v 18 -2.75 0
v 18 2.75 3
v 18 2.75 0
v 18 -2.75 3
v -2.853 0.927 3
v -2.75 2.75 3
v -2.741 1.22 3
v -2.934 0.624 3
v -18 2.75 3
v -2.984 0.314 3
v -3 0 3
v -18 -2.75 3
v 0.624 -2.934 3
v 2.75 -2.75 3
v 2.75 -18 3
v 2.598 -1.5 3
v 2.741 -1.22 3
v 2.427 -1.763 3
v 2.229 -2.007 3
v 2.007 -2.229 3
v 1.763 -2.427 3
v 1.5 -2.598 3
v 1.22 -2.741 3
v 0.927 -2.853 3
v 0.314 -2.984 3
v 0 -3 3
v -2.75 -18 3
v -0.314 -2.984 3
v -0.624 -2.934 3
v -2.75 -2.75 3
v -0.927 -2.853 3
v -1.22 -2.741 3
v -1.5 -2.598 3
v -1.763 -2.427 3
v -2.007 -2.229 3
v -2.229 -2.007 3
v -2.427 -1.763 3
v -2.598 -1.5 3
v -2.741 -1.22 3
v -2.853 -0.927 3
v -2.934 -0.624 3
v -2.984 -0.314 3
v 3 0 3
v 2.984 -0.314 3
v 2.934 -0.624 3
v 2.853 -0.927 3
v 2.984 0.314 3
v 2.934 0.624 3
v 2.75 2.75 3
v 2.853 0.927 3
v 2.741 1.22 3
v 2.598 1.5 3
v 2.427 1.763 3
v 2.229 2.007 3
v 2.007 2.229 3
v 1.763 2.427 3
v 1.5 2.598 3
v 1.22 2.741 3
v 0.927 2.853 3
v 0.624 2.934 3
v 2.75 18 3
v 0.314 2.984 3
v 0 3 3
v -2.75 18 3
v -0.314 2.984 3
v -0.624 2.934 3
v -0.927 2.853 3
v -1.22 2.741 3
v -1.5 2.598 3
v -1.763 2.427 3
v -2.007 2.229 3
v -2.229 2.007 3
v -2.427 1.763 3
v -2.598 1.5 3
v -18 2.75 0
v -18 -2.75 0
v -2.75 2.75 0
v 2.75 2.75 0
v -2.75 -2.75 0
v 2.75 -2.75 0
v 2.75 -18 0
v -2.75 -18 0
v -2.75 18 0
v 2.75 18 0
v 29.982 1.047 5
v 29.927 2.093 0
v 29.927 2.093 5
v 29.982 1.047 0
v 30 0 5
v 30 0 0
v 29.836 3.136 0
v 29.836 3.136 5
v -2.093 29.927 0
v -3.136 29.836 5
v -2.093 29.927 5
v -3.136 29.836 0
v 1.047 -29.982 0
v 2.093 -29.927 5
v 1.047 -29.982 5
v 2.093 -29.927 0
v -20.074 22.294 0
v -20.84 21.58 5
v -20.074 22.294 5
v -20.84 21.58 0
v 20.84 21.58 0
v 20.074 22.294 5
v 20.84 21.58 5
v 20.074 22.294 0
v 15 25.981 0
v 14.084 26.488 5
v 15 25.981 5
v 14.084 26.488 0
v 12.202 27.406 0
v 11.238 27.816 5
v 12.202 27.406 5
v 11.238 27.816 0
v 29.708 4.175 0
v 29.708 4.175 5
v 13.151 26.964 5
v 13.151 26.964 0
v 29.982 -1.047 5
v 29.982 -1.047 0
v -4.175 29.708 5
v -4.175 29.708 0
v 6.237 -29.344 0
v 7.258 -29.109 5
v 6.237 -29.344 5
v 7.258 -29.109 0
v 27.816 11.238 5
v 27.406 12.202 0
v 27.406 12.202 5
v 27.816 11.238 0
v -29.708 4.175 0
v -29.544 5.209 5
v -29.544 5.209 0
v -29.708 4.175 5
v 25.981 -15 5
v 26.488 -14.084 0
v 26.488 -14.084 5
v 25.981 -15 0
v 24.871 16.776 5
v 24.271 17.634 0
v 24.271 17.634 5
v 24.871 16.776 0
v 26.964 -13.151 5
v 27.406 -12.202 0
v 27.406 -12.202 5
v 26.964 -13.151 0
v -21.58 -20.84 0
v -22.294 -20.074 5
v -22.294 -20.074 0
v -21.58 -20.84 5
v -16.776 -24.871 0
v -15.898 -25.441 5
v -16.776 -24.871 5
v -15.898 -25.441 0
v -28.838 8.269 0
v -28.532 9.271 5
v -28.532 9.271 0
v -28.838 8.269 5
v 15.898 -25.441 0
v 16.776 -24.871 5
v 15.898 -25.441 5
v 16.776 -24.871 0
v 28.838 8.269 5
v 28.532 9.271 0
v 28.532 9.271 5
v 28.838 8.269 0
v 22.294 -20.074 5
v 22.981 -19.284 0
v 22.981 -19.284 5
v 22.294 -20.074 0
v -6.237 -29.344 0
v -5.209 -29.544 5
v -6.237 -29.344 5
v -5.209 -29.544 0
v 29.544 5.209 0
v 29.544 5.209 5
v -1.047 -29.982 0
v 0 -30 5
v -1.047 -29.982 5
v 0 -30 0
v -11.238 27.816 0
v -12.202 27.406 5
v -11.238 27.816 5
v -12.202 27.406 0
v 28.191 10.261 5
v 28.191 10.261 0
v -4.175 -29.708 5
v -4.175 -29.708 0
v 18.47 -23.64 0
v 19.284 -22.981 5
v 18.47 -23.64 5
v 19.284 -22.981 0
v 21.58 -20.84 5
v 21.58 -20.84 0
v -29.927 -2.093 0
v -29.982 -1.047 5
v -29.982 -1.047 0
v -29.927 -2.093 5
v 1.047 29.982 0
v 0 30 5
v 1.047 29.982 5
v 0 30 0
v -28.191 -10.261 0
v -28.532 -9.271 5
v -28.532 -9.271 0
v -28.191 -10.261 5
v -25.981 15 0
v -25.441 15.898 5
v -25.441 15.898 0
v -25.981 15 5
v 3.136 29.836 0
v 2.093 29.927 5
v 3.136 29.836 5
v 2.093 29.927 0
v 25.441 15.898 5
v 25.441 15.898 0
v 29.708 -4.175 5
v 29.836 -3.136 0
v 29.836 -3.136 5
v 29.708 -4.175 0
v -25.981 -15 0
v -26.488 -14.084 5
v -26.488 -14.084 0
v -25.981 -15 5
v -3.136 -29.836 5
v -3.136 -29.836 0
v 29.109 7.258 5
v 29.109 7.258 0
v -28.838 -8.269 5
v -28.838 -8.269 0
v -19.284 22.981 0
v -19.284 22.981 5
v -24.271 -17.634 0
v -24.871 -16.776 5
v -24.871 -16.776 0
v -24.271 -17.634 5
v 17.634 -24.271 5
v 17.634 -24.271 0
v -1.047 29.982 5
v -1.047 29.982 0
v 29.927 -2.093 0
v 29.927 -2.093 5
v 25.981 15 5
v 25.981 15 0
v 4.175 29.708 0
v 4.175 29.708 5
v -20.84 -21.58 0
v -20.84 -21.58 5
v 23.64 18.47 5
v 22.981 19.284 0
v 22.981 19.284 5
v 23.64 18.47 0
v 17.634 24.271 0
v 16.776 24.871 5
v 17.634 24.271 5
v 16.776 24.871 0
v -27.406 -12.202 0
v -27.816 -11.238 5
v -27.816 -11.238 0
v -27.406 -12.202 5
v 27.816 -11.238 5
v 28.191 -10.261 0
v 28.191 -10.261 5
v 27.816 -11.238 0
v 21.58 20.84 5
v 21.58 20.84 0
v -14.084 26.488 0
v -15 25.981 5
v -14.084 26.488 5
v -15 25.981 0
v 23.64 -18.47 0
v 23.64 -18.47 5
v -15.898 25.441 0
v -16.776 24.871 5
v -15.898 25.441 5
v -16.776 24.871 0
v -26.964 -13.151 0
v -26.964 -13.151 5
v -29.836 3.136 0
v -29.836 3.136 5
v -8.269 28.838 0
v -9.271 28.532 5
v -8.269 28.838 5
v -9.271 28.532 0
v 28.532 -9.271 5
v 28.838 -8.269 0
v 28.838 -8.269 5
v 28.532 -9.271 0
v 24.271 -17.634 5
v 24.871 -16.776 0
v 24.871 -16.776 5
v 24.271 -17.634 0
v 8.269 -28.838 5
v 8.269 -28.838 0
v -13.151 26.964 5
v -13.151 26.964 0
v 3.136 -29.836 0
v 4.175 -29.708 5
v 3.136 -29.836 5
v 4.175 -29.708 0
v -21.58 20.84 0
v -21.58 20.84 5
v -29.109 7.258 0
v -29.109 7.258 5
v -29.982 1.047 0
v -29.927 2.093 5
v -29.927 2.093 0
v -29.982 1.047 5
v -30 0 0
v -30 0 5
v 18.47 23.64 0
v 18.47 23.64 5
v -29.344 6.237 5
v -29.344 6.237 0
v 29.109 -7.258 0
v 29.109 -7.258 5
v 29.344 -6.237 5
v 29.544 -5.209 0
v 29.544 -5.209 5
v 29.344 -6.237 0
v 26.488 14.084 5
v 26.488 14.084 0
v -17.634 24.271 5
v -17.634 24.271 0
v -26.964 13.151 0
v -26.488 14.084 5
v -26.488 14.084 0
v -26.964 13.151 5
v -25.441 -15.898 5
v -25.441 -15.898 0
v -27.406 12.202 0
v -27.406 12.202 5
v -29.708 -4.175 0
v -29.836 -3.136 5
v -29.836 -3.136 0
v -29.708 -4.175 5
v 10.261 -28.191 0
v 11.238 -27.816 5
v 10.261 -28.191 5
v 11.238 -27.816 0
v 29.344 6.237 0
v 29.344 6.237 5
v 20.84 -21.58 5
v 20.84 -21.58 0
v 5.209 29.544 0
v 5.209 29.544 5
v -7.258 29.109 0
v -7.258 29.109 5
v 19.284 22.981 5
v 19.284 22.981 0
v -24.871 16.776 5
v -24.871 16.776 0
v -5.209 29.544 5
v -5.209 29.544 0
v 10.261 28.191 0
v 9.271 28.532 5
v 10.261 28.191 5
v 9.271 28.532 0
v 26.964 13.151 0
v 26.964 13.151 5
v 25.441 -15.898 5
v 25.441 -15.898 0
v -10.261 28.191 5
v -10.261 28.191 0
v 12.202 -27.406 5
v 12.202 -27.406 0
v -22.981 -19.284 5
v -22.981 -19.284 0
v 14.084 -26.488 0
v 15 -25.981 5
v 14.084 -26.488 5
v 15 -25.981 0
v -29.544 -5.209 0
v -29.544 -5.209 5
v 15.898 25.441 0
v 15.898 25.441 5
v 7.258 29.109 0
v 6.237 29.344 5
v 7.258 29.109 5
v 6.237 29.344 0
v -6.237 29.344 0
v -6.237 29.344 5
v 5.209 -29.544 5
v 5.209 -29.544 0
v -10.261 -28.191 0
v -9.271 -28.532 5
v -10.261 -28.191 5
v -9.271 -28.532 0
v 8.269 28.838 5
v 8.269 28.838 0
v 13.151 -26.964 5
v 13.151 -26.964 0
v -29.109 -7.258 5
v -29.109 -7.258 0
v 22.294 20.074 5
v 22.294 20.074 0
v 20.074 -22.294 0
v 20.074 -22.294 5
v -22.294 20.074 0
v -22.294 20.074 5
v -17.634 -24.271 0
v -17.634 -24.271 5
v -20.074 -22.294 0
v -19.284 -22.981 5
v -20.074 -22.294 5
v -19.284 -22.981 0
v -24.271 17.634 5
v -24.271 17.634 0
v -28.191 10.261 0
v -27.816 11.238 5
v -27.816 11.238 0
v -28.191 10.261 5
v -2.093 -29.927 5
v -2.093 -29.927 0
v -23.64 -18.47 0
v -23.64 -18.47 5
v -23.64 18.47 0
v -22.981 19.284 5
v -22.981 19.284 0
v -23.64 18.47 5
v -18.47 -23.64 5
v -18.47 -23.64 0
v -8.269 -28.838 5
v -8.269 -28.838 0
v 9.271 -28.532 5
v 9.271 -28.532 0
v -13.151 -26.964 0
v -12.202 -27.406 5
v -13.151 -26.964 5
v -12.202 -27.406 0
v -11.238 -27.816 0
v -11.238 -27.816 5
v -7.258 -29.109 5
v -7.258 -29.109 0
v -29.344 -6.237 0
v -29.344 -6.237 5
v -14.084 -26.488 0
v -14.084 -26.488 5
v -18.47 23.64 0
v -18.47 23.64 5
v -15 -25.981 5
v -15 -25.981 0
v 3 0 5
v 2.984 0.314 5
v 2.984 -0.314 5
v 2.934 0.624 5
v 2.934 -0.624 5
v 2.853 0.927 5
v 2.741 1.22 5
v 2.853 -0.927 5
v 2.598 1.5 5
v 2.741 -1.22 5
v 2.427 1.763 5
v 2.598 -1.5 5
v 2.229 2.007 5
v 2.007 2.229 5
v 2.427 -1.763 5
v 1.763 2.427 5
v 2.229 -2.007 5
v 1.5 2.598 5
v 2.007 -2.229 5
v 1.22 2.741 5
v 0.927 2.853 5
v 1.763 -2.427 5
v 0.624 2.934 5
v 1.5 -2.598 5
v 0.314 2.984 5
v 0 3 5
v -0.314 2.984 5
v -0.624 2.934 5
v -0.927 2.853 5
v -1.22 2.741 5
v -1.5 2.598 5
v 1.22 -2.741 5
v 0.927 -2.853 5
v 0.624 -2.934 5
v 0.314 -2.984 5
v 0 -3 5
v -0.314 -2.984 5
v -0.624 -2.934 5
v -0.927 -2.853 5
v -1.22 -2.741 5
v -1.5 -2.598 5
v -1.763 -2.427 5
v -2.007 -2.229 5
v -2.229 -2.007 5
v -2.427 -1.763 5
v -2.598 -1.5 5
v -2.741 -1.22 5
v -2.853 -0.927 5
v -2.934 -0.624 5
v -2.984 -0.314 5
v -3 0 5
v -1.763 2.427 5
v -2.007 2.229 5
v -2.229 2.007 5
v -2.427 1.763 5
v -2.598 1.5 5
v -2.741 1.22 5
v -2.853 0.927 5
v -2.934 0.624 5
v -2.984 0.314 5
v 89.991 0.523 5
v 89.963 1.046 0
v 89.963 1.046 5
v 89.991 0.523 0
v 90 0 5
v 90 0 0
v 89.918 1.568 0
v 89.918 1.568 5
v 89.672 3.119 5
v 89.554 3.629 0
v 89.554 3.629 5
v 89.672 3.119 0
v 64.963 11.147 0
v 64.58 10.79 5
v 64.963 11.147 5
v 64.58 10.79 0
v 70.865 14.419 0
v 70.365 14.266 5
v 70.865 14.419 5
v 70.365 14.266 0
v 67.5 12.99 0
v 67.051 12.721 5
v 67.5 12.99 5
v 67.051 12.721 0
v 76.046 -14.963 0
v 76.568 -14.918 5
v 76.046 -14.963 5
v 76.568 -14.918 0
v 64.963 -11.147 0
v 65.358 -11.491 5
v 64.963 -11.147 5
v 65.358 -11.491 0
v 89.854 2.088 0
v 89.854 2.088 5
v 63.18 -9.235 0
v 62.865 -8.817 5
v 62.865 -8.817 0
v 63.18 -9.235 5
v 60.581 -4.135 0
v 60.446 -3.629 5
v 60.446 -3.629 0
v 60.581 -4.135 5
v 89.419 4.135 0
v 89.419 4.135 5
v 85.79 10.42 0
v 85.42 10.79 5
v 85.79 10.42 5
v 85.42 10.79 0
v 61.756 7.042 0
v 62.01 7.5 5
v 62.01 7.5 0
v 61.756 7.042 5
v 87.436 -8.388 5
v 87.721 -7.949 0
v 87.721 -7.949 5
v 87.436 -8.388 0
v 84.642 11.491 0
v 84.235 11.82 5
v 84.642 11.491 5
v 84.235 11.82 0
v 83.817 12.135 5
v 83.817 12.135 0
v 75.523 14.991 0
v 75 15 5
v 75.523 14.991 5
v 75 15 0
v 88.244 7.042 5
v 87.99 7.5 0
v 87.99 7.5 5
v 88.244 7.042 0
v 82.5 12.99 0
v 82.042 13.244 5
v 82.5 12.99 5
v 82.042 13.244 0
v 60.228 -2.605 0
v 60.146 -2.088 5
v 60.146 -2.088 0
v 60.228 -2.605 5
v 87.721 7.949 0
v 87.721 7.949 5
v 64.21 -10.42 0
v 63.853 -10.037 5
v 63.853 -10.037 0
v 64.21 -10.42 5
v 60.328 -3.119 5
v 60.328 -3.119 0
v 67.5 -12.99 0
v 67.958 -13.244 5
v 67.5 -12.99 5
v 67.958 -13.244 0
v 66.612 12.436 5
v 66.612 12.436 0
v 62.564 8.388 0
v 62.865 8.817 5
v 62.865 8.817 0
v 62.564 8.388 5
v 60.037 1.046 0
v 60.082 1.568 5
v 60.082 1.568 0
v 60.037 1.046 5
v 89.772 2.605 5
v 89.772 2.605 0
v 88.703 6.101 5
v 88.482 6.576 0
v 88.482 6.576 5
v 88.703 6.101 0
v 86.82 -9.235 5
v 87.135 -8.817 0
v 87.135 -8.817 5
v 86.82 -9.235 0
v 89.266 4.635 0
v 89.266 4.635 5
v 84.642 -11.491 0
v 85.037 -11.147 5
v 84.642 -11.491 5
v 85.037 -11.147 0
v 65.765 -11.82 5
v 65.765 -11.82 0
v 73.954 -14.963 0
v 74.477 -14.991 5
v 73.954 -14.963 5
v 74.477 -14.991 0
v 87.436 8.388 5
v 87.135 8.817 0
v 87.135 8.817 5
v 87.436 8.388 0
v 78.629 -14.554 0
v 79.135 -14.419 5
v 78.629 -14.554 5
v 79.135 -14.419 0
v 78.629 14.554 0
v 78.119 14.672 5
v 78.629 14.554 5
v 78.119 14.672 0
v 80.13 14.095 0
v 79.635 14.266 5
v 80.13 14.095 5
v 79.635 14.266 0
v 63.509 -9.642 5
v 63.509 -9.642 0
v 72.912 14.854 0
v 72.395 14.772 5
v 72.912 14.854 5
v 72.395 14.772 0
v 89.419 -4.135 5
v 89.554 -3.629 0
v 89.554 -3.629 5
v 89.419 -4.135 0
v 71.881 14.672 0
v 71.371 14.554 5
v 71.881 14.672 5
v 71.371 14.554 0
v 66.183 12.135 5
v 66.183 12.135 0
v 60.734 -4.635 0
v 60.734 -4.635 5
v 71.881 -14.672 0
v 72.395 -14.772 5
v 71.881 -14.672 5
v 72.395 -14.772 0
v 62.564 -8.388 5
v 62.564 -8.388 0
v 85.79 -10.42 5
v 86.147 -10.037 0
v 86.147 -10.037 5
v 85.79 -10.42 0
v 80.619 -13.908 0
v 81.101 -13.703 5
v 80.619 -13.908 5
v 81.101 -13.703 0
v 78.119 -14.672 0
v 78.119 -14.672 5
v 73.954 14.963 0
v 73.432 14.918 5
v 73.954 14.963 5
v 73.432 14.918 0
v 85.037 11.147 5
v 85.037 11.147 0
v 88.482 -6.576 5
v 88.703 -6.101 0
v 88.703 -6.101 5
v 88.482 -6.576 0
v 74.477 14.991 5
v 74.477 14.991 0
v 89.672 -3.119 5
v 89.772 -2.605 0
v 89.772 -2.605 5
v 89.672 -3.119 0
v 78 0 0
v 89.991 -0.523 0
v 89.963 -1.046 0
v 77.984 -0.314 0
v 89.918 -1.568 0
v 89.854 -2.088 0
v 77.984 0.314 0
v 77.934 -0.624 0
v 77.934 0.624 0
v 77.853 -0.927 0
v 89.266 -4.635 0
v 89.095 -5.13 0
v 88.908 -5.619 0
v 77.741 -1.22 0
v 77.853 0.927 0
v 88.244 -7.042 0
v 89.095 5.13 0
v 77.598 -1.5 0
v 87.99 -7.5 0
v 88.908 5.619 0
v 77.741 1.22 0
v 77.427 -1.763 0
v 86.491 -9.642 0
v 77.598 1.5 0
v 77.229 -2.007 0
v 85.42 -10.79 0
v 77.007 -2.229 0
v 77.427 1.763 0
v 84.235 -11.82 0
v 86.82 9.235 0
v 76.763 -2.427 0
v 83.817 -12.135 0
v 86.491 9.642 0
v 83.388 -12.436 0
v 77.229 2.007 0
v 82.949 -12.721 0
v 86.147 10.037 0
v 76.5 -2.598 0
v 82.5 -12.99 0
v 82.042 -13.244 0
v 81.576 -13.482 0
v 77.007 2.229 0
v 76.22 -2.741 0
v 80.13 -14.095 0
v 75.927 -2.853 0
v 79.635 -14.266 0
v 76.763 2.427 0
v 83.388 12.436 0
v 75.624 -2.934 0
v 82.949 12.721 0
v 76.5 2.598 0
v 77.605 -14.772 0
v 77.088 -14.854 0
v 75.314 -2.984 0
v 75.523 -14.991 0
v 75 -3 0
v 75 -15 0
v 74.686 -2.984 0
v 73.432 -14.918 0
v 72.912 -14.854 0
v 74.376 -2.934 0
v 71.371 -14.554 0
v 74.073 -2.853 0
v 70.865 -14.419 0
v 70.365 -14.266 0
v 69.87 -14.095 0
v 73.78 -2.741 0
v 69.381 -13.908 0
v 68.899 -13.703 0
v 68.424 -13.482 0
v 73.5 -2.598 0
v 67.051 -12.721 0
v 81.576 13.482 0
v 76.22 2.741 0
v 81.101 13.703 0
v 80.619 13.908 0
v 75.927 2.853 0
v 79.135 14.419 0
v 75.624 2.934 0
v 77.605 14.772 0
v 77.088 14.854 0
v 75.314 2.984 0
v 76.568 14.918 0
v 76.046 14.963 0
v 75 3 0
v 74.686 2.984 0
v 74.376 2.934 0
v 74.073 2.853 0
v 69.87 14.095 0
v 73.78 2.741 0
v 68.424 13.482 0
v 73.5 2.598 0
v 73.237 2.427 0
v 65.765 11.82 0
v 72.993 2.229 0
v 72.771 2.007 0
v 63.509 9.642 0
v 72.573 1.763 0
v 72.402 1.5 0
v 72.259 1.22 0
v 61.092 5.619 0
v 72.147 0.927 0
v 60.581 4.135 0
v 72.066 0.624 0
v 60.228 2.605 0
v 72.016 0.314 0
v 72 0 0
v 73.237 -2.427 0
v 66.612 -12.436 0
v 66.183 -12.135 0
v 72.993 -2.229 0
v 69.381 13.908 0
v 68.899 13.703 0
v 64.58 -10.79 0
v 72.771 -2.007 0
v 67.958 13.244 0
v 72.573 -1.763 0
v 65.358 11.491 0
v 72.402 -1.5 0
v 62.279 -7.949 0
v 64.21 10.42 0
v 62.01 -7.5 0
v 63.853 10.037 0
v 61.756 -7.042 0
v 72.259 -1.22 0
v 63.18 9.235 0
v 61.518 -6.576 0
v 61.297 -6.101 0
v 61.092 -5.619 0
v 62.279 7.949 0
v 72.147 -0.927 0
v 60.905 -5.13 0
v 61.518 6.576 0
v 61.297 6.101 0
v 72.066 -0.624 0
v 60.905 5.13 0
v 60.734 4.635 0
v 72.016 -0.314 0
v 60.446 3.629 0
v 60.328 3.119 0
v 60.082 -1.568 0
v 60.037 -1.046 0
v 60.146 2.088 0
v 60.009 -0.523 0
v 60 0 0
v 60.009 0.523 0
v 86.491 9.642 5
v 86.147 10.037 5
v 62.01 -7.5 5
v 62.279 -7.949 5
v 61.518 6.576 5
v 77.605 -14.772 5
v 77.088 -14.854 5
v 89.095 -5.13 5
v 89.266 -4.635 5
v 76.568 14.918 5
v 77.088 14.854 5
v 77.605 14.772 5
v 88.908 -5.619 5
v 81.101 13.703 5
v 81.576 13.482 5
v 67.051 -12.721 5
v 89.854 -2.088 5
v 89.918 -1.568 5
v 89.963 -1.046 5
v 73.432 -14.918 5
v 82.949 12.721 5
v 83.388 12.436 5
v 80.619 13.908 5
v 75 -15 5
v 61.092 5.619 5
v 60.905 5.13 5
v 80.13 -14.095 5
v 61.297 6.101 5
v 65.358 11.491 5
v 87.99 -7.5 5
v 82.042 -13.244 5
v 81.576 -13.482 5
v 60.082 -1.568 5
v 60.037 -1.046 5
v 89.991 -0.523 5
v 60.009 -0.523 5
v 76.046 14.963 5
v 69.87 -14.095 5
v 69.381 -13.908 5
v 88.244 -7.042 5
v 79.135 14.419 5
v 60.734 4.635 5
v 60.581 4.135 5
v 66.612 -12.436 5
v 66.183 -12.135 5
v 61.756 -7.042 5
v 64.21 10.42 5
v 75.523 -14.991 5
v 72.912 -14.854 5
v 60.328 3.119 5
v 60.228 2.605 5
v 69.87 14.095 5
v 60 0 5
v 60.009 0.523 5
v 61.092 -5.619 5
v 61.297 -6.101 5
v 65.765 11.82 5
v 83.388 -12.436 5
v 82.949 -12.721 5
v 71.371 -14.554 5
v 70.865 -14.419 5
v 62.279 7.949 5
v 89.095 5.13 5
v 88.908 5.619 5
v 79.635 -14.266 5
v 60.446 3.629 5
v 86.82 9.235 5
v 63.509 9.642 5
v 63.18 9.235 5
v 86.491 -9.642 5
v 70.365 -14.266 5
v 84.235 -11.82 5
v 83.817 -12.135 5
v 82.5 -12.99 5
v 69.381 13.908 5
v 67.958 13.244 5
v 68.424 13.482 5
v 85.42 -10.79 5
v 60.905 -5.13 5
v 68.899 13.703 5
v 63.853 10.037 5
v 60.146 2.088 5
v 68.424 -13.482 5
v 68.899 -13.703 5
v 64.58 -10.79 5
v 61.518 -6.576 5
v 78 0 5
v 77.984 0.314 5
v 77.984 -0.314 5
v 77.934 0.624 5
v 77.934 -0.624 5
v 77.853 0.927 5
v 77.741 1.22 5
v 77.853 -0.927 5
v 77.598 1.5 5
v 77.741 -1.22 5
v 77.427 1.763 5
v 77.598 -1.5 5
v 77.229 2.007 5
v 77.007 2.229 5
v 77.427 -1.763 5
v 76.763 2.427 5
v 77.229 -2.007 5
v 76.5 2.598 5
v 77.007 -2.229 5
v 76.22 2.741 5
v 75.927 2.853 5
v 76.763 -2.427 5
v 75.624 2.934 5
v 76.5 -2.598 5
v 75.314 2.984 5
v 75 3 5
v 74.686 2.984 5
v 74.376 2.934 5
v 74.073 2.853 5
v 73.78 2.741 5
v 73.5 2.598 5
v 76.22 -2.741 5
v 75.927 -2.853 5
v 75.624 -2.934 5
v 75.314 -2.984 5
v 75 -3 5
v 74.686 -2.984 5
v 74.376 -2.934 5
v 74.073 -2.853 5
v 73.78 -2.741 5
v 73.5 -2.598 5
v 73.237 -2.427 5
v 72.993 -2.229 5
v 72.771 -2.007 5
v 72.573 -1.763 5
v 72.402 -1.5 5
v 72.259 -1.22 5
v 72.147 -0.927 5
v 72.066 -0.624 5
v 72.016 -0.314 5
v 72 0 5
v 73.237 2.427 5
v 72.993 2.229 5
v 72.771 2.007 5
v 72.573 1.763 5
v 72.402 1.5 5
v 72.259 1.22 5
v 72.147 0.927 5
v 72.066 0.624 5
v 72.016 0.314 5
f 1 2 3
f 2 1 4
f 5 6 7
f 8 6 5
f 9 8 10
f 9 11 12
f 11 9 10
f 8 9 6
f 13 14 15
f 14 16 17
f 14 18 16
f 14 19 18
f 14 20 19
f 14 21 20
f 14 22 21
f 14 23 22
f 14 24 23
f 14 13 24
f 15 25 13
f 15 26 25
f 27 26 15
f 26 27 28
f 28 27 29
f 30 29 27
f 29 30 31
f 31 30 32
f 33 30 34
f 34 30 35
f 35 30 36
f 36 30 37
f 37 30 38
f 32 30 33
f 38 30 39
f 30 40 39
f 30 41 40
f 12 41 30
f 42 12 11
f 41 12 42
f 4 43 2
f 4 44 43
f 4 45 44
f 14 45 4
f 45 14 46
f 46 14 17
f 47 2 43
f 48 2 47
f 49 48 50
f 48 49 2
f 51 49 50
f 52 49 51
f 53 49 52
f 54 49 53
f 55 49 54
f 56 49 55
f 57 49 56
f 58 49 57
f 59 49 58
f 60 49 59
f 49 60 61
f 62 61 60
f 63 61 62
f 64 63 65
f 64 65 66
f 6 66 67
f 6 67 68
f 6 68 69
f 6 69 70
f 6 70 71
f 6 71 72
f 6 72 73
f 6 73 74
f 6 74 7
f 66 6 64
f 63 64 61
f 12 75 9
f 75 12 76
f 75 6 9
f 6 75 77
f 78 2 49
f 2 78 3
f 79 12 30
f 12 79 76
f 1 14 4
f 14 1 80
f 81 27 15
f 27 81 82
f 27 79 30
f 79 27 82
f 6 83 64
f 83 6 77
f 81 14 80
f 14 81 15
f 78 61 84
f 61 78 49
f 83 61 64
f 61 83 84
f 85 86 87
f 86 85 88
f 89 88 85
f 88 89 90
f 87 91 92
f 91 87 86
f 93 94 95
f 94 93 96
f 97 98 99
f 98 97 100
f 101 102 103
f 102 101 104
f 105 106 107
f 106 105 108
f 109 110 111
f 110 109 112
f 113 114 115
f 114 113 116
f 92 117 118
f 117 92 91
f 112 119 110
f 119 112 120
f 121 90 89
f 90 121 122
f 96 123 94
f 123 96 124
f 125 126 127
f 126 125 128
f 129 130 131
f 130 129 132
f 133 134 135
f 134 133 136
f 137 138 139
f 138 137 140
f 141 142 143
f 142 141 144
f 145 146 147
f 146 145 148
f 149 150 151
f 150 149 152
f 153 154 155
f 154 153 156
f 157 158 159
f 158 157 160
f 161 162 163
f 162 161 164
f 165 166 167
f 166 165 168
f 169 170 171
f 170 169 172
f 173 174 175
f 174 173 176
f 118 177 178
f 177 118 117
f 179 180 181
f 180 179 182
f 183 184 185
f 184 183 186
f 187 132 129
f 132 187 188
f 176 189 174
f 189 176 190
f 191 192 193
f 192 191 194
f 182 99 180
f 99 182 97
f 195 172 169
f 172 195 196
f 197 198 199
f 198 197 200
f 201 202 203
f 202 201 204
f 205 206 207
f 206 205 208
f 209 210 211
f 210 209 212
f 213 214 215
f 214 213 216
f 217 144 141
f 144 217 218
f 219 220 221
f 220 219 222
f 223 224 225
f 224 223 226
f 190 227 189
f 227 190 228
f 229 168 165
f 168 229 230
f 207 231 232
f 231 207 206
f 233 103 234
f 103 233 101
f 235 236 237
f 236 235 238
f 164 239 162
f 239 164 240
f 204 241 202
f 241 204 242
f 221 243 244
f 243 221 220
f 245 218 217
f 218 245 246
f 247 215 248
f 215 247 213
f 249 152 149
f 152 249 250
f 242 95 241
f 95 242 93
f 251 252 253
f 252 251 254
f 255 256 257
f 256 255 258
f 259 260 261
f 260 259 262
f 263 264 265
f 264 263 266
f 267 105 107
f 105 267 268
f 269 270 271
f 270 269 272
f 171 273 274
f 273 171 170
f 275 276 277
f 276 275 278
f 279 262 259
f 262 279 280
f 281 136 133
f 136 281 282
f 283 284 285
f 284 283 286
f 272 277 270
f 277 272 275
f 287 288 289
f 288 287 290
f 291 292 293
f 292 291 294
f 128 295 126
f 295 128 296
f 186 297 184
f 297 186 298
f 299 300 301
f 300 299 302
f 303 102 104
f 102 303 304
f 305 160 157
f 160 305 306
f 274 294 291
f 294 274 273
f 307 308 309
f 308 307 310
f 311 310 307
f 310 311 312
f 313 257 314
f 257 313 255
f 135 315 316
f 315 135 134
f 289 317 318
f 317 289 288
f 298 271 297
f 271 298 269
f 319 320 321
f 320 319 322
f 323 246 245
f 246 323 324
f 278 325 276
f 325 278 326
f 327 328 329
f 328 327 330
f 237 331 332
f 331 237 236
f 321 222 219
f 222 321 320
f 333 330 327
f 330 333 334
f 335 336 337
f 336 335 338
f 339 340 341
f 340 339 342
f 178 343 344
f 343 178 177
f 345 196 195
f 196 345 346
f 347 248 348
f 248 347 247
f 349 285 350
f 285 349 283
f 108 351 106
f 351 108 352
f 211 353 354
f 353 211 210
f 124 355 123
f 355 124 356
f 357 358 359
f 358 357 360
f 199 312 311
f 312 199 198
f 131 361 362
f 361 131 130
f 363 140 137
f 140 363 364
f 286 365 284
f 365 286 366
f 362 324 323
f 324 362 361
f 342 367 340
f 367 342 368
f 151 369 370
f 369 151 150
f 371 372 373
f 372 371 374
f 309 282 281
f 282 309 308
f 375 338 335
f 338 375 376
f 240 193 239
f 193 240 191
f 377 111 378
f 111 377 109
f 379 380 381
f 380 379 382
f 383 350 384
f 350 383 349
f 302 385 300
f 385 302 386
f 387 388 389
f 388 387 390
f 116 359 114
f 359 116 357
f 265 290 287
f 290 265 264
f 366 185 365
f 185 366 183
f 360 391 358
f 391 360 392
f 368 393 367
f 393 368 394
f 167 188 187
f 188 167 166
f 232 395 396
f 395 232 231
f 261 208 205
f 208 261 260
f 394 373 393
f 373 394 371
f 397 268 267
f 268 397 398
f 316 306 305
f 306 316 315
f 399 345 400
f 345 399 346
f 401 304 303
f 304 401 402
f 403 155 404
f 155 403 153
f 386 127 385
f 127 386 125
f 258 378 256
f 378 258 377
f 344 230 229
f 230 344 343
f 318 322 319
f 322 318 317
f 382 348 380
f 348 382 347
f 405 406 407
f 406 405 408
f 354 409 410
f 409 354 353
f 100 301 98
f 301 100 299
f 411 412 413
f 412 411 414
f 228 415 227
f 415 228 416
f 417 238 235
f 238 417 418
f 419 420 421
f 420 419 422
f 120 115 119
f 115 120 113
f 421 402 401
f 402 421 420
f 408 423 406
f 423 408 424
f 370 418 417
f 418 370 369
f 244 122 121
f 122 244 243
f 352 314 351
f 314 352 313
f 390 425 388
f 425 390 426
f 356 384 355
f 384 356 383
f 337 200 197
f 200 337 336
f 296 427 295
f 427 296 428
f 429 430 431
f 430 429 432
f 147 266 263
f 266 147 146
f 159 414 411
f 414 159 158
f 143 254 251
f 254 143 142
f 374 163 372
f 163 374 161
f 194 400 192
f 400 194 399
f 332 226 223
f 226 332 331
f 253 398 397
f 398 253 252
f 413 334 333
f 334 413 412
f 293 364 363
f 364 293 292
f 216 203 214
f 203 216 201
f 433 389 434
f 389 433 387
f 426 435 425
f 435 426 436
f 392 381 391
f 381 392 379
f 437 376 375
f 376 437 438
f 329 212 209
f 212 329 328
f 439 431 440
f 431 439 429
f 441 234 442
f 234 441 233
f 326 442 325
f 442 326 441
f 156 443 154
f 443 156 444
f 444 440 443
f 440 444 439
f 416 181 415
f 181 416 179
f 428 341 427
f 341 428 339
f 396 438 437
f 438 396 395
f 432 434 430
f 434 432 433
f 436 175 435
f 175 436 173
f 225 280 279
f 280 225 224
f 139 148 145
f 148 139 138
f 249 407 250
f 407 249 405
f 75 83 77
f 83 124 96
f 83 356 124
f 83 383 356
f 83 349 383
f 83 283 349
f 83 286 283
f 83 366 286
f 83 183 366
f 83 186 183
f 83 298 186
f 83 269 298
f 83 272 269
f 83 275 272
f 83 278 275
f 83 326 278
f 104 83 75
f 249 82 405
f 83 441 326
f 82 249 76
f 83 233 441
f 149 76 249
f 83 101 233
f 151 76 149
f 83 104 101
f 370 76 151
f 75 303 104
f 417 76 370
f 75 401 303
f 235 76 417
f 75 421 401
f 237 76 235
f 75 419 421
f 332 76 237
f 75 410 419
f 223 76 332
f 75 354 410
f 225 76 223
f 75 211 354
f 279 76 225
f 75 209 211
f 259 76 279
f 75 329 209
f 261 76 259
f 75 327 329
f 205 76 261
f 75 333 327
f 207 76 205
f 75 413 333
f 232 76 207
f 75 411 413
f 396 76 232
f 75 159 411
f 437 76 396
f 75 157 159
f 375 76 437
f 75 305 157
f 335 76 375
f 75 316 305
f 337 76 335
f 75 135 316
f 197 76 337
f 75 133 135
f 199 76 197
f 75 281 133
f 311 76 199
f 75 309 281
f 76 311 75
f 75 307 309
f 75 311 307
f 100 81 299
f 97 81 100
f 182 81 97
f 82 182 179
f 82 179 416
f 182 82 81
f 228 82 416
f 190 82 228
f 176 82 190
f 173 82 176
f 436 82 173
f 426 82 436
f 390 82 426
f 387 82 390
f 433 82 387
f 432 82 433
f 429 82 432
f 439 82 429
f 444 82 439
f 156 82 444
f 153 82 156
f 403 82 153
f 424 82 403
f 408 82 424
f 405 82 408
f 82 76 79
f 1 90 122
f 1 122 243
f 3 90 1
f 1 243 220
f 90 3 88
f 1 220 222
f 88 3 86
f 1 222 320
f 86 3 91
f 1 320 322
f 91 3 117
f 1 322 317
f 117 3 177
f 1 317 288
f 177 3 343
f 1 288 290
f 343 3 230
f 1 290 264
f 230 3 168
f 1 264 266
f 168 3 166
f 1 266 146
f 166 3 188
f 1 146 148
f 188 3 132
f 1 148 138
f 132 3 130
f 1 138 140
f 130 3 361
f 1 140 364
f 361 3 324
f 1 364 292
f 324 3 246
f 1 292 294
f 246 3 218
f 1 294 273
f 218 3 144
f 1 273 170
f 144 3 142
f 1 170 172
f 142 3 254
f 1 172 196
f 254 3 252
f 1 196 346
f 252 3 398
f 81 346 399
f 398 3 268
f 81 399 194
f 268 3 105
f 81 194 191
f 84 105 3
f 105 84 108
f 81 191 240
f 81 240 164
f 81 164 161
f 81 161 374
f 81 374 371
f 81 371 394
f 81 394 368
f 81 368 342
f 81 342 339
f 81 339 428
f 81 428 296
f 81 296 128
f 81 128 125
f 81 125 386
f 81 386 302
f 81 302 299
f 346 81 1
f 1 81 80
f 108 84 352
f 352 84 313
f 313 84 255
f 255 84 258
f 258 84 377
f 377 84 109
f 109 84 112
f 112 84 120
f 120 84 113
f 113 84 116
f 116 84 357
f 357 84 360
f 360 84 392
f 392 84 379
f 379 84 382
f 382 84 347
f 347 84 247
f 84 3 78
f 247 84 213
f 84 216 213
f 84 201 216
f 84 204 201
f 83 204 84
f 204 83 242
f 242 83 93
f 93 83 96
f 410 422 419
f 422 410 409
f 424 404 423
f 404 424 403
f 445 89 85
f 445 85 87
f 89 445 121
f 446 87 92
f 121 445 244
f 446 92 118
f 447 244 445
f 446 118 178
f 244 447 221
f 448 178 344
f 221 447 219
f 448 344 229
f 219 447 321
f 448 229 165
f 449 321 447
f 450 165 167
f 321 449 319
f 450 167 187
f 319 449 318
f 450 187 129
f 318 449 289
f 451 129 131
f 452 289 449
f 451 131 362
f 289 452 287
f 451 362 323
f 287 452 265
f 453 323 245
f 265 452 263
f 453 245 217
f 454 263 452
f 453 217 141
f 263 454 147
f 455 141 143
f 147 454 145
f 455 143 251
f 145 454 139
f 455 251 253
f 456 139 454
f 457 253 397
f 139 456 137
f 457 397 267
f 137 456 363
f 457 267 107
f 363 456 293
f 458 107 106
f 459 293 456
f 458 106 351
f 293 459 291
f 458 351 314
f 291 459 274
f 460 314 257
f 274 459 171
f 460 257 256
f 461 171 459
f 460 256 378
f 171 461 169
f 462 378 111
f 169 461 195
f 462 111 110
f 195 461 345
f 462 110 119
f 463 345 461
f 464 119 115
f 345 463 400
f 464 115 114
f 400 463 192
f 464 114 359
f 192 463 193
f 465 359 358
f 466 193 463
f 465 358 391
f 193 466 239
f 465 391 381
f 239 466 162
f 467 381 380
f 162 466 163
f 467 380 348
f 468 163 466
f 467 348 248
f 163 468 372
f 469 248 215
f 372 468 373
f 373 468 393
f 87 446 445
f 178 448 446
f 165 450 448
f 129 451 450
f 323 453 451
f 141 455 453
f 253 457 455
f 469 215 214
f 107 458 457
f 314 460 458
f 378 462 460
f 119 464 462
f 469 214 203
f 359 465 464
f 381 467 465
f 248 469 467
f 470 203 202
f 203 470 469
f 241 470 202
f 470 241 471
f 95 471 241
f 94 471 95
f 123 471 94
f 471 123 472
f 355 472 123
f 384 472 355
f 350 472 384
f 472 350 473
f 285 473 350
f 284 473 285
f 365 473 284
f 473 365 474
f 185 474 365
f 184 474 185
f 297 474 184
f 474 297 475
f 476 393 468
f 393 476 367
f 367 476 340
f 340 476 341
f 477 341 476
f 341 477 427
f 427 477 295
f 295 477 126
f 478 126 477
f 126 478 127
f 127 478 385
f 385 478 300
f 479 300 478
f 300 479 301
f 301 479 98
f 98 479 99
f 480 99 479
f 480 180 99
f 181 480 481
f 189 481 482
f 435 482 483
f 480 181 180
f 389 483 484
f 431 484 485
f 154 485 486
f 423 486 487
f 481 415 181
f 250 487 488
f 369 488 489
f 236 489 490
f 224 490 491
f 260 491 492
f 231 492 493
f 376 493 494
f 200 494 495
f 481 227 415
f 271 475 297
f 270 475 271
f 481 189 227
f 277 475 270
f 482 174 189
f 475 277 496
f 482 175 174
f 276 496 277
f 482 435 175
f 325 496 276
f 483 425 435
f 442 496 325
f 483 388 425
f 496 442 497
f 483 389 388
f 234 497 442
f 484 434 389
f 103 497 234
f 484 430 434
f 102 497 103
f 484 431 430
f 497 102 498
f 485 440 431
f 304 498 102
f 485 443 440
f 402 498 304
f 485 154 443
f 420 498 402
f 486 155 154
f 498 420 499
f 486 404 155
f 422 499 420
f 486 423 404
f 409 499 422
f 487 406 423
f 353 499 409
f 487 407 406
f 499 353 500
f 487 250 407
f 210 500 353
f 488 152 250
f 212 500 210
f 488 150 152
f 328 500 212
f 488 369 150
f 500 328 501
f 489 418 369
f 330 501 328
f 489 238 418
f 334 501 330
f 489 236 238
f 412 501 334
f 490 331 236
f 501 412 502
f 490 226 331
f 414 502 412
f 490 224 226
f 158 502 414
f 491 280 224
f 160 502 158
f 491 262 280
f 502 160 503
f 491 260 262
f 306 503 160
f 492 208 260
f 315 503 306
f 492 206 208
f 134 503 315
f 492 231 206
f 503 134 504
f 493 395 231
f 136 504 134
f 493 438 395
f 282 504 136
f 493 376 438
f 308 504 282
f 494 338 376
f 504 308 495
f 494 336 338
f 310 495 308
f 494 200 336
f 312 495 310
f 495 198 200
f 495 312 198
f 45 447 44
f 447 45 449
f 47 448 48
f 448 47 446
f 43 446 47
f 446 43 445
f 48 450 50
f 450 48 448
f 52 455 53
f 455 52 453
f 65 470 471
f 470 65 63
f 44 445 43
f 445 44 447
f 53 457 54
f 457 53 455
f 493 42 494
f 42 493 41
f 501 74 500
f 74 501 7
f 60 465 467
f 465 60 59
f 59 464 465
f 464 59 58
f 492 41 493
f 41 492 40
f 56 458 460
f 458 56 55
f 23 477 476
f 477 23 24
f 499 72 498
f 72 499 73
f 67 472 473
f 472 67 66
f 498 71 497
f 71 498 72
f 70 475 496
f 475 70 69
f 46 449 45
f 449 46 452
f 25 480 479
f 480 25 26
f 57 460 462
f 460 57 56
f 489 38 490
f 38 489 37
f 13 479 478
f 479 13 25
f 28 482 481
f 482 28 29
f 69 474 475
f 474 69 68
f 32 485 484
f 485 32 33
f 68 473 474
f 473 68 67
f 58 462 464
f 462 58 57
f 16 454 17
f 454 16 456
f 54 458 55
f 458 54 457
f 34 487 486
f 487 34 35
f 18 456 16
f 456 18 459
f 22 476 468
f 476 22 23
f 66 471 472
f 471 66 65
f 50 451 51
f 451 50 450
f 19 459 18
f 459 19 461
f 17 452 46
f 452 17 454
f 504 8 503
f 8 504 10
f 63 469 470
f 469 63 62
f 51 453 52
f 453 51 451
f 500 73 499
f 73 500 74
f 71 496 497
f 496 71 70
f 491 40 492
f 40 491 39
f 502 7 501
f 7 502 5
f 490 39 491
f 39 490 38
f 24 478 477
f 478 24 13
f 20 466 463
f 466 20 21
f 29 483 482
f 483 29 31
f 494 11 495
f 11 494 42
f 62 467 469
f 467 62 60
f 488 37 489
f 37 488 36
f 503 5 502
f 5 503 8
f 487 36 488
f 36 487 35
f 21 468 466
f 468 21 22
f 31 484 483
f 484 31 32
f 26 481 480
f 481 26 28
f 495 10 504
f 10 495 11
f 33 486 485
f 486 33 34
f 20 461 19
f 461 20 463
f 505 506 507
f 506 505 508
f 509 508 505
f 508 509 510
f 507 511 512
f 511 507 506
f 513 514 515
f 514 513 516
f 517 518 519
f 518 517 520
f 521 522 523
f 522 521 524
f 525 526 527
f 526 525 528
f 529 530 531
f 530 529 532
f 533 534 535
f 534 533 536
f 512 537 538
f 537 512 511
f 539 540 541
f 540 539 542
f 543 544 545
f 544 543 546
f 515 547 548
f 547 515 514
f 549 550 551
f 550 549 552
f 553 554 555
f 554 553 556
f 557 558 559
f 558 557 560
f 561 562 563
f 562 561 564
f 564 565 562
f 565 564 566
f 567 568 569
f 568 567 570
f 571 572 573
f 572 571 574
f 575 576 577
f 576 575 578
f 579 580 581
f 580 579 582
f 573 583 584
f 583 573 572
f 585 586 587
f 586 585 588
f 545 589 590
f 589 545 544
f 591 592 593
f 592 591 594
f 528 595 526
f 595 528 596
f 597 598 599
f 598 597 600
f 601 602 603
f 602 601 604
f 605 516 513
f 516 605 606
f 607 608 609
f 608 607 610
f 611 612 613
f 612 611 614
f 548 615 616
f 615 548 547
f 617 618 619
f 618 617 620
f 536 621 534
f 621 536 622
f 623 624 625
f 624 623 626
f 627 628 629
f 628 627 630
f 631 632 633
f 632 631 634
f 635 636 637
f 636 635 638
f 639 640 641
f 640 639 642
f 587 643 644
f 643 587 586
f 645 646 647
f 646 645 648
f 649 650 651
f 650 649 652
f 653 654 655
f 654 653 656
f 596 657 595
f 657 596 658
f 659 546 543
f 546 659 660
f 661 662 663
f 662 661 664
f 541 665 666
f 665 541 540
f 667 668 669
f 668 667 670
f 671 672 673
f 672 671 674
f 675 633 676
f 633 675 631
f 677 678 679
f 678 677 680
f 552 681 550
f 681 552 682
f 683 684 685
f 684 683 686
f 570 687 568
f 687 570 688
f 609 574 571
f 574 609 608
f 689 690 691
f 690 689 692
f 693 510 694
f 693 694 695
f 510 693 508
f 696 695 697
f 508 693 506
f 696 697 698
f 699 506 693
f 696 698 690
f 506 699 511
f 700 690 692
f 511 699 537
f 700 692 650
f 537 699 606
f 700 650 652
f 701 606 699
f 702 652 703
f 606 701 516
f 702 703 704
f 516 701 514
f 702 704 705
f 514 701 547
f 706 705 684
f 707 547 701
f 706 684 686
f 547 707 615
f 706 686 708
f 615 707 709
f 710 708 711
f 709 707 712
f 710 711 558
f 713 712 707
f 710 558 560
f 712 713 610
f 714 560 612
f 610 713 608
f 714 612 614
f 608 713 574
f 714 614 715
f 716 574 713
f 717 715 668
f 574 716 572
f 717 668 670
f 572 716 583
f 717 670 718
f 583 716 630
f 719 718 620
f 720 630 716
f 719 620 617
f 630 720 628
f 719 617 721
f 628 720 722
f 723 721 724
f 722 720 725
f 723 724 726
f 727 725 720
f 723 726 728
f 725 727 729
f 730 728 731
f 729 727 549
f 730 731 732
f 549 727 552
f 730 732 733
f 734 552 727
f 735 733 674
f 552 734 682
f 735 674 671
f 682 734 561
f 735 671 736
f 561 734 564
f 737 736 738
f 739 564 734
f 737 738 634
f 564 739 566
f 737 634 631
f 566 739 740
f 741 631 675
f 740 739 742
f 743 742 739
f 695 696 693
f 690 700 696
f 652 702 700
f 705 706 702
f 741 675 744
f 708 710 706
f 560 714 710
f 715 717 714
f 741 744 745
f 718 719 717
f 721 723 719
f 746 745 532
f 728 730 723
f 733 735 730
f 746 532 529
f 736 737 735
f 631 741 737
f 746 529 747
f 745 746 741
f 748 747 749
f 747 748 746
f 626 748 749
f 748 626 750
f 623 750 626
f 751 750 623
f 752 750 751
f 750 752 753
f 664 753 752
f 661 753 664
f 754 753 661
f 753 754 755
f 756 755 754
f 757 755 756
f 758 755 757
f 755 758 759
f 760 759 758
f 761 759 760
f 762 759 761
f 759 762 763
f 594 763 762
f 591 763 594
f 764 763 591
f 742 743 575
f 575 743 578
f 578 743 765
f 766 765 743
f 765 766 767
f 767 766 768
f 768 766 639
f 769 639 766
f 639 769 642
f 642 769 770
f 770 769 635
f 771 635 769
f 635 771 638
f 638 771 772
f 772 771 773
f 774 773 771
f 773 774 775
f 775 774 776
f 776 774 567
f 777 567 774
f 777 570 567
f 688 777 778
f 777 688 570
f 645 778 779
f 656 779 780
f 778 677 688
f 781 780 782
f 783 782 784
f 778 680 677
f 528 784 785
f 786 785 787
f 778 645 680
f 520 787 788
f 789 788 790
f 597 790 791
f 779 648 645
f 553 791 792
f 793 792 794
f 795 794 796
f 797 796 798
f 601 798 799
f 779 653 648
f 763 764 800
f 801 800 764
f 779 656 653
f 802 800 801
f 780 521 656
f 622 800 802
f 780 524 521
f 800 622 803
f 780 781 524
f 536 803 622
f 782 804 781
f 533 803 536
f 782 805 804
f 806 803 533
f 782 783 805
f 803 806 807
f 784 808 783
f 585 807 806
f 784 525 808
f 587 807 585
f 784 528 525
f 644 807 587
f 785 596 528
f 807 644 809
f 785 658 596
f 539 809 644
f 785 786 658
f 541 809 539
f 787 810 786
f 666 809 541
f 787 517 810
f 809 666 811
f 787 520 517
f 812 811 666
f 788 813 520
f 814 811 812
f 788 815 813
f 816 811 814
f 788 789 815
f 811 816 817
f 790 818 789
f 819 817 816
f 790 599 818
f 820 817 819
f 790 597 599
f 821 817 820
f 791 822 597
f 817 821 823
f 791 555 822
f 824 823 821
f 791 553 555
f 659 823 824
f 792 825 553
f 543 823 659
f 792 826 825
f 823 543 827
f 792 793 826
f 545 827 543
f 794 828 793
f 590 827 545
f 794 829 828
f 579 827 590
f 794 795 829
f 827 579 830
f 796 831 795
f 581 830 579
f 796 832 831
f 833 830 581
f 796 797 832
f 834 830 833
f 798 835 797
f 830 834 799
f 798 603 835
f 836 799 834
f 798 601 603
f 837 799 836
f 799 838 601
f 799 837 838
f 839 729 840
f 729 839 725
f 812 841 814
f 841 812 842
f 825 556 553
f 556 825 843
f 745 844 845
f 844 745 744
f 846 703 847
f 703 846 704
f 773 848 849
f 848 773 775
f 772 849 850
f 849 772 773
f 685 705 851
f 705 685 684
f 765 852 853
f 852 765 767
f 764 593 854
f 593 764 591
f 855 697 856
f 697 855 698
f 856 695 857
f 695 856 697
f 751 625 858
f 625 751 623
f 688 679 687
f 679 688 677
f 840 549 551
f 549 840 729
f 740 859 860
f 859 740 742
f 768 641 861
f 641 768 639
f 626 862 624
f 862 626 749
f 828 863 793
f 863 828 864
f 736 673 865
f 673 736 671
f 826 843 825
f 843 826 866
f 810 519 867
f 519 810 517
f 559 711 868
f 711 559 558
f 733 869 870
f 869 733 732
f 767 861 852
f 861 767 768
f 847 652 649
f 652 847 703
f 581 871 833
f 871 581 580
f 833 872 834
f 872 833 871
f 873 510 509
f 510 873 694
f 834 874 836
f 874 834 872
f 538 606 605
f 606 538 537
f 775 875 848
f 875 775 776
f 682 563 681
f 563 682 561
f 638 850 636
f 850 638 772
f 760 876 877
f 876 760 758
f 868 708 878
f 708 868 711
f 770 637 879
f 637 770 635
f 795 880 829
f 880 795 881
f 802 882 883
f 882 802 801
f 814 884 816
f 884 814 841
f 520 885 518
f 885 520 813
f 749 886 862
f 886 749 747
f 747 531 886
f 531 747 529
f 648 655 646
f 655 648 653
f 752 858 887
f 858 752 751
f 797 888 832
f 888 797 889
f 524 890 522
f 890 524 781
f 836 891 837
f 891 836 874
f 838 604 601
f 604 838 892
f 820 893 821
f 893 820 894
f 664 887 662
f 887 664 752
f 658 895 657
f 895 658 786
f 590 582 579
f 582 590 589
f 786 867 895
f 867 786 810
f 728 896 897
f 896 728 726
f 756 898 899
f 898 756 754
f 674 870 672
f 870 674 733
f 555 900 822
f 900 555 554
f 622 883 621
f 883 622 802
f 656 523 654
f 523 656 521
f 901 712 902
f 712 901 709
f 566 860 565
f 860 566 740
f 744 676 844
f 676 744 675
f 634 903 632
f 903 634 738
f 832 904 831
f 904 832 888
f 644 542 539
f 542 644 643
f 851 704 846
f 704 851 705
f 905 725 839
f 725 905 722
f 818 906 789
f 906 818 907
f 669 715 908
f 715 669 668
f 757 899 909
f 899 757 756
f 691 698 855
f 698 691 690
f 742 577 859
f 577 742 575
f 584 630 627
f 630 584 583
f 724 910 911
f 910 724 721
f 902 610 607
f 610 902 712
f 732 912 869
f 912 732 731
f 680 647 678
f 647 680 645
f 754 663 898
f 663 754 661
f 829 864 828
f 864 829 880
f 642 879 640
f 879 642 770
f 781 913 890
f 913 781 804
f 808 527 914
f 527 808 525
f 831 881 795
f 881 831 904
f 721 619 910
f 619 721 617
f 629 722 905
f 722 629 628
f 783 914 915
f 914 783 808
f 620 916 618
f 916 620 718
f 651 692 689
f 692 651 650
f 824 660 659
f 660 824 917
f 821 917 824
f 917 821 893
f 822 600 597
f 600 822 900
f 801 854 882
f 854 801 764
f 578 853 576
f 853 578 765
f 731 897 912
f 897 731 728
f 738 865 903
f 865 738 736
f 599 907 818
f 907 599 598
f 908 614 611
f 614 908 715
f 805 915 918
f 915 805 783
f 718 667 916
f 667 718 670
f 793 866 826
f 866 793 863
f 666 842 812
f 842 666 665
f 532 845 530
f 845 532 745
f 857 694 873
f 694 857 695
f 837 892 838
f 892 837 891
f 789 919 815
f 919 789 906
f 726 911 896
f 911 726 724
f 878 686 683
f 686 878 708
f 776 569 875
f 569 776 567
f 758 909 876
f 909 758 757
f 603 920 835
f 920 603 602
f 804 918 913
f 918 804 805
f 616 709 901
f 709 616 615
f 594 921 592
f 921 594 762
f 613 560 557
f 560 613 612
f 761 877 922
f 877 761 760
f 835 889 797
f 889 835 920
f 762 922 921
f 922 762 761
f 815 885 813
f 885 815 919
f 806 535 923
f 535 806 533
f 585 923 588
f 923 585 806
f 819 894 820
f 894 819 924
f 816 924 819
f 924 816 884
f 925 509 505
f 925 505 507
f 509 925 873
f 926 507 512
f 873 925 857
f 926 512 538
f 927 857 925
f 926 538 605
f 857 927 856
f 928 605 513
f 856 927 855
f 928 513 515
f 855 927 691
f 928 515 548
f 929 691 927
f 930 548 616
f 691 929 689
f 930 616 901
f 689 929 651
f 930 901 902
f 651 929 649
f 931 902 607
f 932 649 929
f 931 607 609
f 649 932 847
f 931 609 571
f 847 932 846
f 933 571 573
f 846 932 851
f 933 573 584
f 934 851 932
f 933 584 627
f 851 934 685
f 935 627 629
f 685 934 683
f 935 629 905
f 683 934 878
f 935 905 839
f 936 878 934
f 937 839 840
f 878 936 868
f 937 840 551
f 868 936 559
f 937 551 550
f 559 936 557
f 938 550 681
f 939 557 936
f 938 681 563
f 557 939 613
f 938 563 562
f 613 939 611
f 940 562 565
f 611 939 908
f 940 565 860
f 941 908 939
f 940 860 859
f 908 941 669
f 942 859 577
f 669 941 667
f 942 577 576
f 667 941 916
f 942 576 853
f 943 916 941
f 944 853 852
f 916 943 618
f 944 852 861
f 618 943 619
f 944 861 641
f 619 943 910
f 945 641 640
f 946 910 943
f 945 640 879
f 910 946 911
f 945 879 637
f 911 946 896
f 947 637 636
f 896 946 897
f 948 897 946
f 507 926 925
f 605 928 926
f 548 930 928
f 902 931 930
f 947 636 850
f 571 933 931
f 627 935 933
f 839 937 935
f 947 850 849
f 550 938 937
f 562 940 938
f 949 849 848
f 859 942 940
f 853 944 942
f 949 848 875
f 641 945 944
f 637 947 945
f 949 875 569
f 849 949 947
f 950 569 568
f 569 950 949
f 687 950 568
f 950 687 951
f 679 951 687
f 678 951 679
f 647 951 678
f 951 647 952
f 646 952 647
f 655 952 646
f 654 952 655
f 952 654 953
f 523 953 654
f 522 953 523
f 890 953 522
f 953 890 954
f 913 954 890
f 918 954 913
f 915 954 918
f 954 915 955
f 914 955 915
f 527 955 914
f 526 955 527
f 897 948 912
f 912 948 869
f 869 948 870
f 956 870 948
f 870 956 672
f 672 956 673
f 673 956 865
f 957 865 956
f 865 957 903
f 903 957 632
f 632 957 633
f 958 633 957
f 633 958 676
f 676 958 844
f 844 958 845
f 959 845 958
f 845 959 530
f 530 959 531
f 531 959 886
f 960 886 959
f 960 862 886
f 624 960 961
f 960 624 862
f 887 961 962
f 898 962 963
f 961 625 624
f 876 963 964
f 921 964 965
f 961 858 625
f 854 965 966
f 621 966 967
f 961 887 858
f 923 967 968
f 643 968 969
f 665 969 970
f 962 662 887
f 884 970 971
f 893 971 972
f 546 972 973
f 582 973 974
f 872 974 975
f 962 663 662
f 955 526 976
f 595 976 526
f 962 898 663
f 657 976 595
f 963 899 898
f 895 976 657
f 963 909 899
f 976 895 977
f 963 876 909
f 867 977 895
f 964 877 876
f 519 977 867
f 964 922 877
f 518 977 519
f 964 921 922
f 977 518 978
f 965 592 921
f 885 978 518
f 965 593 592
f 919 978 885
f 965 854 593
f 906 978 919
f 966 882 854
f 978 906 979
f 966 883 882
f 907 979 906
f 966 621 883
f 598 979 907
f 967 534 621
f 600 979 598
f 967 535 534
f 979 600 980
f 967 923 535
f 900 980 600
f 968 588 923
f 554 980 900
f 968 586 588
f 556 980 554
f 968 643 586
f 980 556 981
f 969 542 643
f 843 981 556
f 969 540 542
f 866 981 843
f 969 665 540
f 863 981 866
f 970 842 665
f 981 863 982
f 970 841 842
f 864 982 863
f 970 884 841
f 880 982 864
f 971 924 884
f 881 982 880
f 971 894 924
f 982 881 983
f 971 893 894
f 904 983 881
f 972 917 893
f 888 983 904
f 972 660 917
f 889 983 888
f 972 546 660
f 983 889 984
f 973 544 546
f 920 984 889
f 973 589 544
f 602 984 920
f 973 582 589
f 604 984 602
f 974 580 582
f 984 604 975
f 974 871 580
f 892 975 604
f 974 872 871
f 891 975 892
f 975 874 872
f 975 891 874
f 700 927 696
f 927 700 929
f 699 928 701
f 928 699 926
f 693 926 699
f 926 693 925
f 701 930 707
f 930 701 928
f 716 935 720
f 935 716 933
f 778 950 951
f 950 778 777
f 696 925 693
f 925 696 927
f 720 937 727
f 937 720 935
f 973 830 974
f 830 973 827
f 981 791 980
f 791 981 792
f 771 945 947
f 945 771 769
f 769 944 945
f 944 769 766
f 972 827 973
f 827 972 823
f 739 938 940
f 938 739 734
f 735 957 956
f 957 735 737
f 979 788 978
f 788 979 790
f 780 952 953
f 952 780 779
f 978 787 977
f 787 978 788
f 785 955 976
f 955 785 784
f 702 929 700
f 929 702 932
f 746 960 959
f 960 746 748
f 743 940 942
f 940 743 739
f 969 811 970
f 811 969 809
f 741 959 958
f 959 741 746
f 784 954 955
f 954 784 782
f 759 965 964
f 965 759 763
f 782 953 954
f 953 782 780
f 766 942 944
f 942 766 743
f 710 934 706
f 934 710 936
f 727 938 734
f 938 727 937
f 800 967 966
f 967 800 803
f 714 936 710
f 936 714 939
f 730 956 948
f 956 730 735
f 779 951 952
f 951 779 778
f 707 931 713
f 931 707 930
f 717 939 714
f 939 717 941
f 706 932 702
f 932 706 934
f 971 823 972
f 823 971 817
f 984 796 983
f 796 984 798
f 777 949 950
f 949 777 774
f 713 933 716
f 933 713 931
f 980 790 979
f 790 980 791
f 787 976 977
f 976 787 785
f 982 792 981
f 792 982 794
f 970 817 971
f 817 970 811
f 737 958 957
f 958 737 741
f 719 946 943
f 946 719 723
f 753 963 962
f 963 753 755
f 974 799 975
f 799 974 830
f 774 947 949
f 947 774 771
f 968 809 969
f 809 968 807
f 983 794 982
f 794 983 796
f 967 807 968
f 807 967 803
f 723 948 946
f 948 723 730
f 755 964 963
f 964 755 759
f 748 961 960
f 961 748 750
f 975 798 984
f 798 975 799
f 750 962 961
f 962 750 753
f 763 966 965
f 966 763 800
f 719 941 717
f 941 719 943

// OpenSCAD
/*
  Geneva mechanism (4-slot wheel + drive pin; teaching scale).
*/
slots = 4;
wheel_r = 30;
pin_r = 2.5;
th = 5;
$fn=180;

module geneva_wheel(){
  difference(){
    cylinder(h=th, r=wheel_r);
    for(i=[0:slots-1]) rotate([0,0,i*(360/slots)]) cube([wheel_r*1.2, pin_r*2.2, th+1], center=true);
    translate([0,0,-1]) cylinder(h=th+2, r=3, $fn=60);
  }
}

module drive_disk(){
  difference(){
    cylinder(h=th, r=wheel_r/2);
    translate([0,0,-1]) cylinder(h=th+2, r=3, $fn=60);
  }
  translate([wheel_r/2 - pin_r*1.2,0,0]) cylinder(h=th, r=pin_r, $fn=60);
}

geneva_wheel();
translate([75,0,0]) drive_disk();
